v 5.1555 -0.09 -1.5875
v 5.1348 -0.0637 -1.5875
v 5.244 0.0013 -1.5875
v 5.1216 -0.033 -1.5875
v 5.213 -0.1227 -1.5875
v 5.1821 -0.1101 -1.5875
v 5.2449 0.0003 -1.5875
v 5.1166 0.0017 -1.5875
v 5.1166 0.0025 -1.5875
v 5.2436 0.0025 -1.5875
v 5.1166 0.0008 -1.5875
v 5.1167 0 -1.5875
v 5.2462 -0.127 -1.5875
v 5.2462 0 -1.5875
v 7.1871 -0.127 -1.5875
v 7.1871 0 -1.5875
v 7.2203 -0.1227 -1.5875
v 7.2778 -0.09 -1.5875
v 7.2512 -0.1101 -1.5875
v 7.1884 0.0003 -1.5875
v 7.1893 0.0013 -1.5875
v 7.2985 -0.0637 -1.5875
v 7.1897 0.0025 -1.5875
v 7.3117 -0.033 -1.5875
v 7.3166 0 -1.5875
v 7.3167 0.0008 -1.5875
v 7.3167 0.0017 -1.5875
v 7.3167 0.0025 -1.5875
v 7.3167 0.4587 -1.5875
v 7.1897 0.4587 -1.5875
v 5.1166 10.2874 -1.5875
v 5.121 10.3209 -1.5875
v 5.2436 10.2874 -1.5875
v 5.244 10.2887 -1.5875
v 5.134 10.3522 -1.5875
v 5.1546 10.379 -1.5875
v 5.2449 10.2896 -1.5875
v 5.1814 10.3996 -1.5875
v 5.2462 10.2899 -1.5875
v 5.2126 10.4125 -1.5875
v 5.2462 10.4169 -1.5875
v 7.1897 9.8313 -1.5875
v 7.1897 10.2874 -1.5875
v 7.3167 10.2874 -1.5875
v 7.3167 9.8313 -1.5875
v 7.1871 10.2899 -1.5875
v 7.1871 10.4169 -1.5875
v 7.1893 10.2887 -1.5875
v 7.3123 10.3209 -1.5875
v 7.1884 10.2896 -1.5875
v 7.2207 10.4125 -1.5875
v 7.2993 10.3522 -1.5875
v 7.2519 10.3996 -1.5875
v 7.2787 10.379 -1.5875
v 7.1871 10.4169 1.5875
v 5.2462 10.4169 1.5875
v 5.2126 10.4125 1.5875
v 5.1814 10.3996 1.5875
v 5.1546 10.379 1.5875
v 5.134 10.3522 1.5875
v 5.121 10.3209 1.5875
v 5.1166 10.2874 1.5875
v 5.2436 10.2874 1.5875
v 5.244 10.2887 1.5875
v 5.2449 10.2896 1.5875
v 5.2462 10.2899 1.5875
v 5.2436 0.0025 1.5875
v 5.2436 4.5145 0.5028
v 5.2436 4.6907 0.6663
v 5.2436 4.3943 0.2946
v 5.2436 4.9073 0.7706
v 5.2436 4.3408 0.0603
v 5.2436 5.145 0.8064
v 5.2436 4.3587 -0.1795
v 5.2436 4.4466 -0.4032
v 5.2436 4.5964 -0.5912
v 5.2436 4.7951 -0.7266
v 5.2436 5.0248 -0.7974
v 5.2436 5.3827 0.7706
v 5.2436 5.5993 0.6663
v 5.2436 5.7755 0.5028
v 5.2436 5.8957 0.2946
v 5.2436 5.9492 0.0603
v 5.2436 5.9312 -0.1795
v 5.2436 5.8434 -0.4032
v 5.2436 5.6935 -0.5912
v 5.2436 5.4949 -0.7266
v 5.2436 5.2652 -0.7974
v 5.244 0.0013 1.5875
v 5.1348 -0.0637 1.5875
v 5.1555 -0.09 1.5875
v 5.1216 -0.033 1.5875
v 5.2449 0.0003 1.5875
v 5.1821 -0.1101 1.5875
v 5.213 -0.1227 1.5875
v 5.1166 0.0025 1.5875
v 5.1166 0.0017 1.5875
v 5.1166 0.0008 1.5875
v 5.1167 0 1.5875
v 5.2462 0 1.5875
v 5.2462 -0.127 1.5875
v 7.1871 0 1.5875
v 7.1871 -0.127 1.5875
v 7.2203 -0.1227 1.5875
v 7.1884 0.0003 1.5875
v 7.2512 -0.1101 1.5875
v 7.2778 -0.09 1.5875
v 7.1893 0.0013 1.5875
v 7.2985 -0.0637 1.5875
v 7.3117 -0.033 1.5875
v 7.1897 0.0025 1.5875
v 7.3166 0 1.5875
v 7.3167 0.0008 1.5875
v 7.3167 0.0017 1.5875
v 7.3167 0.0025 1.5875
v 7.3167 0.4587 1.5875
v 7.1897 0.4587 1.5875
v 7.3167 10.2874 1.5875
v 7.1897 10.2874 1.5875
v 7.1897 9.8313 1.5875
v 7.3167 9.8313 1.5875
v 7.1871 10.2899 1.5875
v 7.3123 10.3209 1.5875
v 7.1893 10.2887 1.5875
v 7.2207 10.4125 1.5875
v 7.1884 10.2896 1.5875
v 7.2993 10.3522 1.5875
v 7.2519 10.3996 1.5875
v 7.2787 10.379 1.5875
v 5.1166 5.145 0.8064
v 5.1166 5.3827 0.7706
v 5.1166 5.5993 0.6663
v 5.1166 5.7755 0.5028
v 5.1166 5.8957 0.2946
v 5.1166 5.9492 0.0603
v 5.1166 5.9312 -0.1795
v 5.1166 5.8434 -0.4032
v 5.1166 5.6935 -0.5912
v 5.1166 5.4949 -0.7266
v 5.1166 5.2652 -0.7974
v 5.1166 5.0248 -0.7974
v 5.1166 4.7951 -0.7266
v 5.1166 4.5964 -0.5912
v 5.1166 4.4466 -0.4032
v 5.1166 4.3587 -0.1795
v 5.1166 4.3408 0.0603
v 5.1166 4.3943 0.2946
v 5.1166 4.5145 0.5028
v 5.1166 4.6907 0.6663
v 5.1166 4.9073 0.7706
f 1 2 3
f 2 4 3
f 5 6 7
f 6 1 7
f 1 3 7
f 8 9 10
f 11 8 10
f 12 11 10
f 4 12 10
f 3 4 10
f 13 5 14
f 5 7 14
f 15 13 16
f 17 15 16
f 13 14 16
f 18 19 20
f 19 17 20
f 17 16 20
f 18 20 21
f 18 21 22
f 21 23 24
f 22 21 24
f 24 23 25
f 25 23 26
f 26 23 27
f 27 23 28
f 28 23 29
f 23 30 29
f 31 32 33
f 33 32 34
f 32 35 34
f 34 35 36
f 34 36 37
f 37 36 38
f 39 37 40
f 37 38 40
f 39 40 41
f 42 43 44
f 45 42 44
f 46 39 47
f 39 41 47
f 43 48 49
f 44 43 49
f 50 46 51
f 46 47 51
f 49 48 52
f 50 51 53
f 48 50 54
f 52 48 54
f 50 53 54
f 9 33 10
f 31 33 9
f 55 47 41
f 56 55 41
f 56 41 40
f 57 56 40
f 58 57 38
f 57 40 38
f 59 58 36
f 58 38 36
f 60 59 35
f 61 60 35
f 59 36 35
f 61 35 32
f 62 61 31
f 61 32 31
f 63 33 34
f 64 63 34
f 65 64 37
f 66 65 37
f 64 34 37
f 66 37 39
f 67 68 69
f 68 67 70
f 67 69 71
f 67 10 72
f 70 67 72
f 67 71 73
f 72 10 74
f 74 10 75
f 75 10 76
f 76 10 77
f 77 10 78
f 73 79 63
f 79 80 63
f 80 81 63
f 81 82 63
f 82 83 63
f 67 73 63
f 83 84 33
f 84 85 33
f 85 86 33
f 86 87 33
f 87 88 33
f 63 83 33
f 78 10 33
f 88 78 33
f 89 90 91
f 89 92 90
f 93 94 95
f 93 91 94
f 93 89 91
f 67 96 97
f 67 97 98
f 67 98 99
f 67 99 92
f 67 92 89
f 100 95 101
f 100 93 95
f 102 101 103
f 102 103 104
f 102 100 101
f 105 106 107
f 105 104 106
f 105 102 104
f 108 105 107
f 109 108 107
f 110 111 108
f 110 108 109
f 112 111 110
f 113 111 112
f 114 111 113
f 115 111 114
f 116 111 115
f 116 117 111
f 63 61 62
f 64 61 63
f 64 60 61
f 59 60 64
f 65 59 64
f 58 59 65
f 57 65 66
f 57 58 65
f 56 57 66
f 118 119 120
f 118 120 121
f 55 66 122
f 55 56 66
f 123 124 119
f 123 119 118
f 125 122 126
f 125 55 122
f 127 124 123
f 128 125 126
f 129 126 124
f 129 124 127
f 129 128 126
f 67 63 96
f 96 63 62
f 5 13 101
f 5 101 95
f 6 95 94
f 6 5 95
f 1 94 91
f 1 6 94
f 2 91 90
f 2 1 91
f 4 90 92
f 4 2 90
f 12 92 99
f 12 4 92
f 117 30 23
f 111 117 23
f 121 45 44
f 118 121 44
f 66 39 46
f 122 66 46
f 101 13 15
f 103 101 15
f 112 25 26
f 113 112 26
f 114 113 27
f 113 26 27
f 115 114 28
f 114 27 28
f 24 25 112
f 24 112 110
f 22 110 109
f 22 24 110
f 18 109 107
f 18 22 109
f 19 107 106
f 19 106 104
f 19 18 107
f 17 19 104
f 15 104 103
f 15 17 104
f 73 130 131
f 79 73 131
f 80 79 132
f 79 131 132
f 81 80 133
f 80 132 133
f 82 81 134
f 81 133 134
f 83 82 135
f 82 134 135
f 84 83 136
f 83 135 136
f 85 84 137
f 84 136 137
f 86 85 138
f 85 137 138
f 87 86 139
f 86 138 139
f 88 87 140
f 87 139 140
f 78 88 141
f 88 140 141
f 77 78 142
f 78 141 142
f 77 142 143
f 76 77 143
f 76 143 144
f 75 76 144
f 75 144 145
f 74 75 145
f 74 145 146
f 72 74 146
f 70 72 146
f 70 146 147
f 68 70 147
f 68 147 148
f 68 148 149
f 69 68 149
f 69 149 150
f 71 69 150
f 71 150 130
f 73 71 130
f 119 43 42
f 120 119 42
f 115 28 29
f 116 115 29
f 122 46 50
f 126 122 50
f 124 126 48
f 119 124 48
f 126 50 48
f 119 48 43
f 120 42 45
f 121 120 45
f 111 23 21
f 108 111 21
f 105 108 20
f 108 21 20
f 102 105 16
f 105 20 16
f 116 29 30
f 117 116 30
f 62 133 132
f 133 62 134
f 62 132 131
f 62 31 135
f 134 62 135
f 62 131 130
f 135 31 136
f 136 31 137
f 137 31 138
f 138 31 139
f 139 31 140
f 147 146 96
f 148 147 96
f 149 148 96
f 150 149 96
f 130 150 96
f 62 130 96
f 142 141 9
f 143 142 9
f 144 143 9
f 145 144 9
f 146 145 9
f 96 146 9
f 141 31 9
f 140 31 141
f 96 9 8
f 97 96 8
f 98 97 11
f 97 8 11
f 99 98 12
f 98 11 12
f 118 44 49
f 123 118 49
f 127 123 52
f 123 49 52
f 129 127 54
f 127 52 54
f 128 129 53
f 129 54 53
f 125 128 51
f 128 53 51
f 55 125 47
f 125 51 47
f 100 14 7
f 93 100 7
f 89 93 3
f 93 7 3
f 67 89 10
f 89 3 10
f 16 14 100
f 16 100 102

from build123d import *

# Parameters (mm, degrees)
SKETCH1_W                 = 15.494
SKETCH1_H                 = 3.175
BASE_FLANGE1_DEPTH        = 0.127
SKETCHED_START            = -1.5875
SKETCHED_BEND16_DEPTH     = 3.175
SKETCHED_BEND16_2_DEPTH   = 3.175
F_0_CLEARANCE_HOLE1_D     = 1.6129
F_0_CLEARANCE_HOLE1_DEPTH = 4.826
F_0_CLEARANCE_HOLE1_TIP   = 0.484564046


# Read off the part's stored shape, not the designer's step: Sketched Bend16
# Sheet-metal steps are written as plain solids
with BuildPart() as part:
    # Sketch1 → Base-Flange1 (new body)
    with BuildSketch(Plane(origin=(0, 0, 0), x_dir=(1, 0, 0), z_dir=(0, 1, 0))):
        Rectangle(SKETCH1_W, SKETCH1_H)
    extrude(amount=-BASE_FLANGE1_DEPTH)

    # Sketched Bend16 outline → Sketched Bend16 (cut)
    with BuildSketch(Plane.XY.offset(SKETCHED_START)):
        with BuildLine():
            ThreePointArc((5.246167695, -0.127), (5.155471554, -0.089952279), (5.116652599, 0))
            Line((5.116652599, 0), (-7.747, 0))
            Line((-7.747, 0), (-7.747, -0.127))
            Line((-7.747, -0.127), (5.246167695, -0.127))
        make_face()
        with BuildLine():
            Line((7.747, 0), (7.316647401, 0))
            ThreePointArc((7.316647401, 0), (7.277828446, -0.089952279), (7.187132305, -0.127))
            Line((7.187132305, -0.127), (7.747, -0.127))
            Line((7.747, -0.127), (7.747, 0))
        make_face()
    extrude(amount=SKETCHED_BEND16_DEPTH, mode=Mode.SUBTRACT)

    # Sketched Bend16 2 outline → Sketched Bend16 2 (add)
    with BuildSketch(Plane.XY.offset(SKETCHED_START)):
        with BuildLine():
            Line((5.243627695, 0.00254), (5.243627695, 10.287404611))
            ThreePointArc((5.243627695, 10.287404611), (5.244371643, 10.289200662), (5.246167695, 10.289944611))
            Line((5.246167695, 10.289944611), (7.187132305, 10.289944611))
            ThreePointArc((7.187132305, 10.289944611), (7.188928357, 10.289200662), (7.189672305, 10.287404611))
            Line((7.189672305, 10.287404611), (7.189672305, 9.831272305))
            Line((7.189672305, 9.831272305), (7.316672305, 9.831272305))
            Line((7.316672305, 9.831272305), (7.316672305, 10.287404611))
            ThreePointArc((7.316672305, 10.287404611), (7.278730917, 10.379003223), (7.187132305, 10.416944611))
            Line((7.187132305, 10.416944611), (5.246167695, 10.416944611))
            ThreePointArc((5.246167695, 10.416944611), (5.154569083, 10.379003223), (5.116627695, 10.287404611))
            Line((5.116627695, 10.287404611), (5.116627695, 0.00254))
            ThreePointArc((5.116627695, 0.00254), (5.116633921, 0.001269939), (5.116652599, 0))
            Line((5.116652599, 0), (5.246167695, 0))
            ThreePointArc((5.246167695, 0), (5.244371644, 0.000743949), (5.243627695, 0.00254))
        make_face()
        with BuildLine():
            ThreePointArc((7.189672305, 0.00254), (7.188928356, 0.000743949), (7.187132305, 0))
            Line((7.187132305, 0), (7.316647401, 0))
            ThreePointArc((7.316647401, 0), (7.316666079, 0.001269939), (7.316672305, 0.00254))
            Line((7.316672305, 0.00254), (7.316672305, 0.458672305))
            Line((7.316672305, 0.458672305), (7.189672305, 0.458672305))
            Line((7.189672305, 0.458672305), (7.189672305, 0.00254))
        make_face()
    extrude(amount=SKETCHED_BEND16_2_DEPTH)

    # #0 Clearance Hole1
    with Locations(Plane(origin=(5.243627695, 0, 0), x_dir=(0, 0, -1), z_dir=(1, 0, 0))):
        with Locations((0, 5.144972305)):
            Hole(F_0_CLEARANCE_HOLE1_D / 2, depth=F_0_CLEARANCE_HOLE1_DEPTH)
            with Locations((0, 0, -(F_0_CLEARANCE_HOLE1_DEPTH + F_0_CLEARANCE_HOLE1_TIP / 2))):  # 118° drill point
                Cone(0, F_0_CLEARANCE_HOLE1_D / 2, F_0_CLEARANCE_HOLE1_TIP, mode=Mode.SUBTRACT)


solid = part.part
